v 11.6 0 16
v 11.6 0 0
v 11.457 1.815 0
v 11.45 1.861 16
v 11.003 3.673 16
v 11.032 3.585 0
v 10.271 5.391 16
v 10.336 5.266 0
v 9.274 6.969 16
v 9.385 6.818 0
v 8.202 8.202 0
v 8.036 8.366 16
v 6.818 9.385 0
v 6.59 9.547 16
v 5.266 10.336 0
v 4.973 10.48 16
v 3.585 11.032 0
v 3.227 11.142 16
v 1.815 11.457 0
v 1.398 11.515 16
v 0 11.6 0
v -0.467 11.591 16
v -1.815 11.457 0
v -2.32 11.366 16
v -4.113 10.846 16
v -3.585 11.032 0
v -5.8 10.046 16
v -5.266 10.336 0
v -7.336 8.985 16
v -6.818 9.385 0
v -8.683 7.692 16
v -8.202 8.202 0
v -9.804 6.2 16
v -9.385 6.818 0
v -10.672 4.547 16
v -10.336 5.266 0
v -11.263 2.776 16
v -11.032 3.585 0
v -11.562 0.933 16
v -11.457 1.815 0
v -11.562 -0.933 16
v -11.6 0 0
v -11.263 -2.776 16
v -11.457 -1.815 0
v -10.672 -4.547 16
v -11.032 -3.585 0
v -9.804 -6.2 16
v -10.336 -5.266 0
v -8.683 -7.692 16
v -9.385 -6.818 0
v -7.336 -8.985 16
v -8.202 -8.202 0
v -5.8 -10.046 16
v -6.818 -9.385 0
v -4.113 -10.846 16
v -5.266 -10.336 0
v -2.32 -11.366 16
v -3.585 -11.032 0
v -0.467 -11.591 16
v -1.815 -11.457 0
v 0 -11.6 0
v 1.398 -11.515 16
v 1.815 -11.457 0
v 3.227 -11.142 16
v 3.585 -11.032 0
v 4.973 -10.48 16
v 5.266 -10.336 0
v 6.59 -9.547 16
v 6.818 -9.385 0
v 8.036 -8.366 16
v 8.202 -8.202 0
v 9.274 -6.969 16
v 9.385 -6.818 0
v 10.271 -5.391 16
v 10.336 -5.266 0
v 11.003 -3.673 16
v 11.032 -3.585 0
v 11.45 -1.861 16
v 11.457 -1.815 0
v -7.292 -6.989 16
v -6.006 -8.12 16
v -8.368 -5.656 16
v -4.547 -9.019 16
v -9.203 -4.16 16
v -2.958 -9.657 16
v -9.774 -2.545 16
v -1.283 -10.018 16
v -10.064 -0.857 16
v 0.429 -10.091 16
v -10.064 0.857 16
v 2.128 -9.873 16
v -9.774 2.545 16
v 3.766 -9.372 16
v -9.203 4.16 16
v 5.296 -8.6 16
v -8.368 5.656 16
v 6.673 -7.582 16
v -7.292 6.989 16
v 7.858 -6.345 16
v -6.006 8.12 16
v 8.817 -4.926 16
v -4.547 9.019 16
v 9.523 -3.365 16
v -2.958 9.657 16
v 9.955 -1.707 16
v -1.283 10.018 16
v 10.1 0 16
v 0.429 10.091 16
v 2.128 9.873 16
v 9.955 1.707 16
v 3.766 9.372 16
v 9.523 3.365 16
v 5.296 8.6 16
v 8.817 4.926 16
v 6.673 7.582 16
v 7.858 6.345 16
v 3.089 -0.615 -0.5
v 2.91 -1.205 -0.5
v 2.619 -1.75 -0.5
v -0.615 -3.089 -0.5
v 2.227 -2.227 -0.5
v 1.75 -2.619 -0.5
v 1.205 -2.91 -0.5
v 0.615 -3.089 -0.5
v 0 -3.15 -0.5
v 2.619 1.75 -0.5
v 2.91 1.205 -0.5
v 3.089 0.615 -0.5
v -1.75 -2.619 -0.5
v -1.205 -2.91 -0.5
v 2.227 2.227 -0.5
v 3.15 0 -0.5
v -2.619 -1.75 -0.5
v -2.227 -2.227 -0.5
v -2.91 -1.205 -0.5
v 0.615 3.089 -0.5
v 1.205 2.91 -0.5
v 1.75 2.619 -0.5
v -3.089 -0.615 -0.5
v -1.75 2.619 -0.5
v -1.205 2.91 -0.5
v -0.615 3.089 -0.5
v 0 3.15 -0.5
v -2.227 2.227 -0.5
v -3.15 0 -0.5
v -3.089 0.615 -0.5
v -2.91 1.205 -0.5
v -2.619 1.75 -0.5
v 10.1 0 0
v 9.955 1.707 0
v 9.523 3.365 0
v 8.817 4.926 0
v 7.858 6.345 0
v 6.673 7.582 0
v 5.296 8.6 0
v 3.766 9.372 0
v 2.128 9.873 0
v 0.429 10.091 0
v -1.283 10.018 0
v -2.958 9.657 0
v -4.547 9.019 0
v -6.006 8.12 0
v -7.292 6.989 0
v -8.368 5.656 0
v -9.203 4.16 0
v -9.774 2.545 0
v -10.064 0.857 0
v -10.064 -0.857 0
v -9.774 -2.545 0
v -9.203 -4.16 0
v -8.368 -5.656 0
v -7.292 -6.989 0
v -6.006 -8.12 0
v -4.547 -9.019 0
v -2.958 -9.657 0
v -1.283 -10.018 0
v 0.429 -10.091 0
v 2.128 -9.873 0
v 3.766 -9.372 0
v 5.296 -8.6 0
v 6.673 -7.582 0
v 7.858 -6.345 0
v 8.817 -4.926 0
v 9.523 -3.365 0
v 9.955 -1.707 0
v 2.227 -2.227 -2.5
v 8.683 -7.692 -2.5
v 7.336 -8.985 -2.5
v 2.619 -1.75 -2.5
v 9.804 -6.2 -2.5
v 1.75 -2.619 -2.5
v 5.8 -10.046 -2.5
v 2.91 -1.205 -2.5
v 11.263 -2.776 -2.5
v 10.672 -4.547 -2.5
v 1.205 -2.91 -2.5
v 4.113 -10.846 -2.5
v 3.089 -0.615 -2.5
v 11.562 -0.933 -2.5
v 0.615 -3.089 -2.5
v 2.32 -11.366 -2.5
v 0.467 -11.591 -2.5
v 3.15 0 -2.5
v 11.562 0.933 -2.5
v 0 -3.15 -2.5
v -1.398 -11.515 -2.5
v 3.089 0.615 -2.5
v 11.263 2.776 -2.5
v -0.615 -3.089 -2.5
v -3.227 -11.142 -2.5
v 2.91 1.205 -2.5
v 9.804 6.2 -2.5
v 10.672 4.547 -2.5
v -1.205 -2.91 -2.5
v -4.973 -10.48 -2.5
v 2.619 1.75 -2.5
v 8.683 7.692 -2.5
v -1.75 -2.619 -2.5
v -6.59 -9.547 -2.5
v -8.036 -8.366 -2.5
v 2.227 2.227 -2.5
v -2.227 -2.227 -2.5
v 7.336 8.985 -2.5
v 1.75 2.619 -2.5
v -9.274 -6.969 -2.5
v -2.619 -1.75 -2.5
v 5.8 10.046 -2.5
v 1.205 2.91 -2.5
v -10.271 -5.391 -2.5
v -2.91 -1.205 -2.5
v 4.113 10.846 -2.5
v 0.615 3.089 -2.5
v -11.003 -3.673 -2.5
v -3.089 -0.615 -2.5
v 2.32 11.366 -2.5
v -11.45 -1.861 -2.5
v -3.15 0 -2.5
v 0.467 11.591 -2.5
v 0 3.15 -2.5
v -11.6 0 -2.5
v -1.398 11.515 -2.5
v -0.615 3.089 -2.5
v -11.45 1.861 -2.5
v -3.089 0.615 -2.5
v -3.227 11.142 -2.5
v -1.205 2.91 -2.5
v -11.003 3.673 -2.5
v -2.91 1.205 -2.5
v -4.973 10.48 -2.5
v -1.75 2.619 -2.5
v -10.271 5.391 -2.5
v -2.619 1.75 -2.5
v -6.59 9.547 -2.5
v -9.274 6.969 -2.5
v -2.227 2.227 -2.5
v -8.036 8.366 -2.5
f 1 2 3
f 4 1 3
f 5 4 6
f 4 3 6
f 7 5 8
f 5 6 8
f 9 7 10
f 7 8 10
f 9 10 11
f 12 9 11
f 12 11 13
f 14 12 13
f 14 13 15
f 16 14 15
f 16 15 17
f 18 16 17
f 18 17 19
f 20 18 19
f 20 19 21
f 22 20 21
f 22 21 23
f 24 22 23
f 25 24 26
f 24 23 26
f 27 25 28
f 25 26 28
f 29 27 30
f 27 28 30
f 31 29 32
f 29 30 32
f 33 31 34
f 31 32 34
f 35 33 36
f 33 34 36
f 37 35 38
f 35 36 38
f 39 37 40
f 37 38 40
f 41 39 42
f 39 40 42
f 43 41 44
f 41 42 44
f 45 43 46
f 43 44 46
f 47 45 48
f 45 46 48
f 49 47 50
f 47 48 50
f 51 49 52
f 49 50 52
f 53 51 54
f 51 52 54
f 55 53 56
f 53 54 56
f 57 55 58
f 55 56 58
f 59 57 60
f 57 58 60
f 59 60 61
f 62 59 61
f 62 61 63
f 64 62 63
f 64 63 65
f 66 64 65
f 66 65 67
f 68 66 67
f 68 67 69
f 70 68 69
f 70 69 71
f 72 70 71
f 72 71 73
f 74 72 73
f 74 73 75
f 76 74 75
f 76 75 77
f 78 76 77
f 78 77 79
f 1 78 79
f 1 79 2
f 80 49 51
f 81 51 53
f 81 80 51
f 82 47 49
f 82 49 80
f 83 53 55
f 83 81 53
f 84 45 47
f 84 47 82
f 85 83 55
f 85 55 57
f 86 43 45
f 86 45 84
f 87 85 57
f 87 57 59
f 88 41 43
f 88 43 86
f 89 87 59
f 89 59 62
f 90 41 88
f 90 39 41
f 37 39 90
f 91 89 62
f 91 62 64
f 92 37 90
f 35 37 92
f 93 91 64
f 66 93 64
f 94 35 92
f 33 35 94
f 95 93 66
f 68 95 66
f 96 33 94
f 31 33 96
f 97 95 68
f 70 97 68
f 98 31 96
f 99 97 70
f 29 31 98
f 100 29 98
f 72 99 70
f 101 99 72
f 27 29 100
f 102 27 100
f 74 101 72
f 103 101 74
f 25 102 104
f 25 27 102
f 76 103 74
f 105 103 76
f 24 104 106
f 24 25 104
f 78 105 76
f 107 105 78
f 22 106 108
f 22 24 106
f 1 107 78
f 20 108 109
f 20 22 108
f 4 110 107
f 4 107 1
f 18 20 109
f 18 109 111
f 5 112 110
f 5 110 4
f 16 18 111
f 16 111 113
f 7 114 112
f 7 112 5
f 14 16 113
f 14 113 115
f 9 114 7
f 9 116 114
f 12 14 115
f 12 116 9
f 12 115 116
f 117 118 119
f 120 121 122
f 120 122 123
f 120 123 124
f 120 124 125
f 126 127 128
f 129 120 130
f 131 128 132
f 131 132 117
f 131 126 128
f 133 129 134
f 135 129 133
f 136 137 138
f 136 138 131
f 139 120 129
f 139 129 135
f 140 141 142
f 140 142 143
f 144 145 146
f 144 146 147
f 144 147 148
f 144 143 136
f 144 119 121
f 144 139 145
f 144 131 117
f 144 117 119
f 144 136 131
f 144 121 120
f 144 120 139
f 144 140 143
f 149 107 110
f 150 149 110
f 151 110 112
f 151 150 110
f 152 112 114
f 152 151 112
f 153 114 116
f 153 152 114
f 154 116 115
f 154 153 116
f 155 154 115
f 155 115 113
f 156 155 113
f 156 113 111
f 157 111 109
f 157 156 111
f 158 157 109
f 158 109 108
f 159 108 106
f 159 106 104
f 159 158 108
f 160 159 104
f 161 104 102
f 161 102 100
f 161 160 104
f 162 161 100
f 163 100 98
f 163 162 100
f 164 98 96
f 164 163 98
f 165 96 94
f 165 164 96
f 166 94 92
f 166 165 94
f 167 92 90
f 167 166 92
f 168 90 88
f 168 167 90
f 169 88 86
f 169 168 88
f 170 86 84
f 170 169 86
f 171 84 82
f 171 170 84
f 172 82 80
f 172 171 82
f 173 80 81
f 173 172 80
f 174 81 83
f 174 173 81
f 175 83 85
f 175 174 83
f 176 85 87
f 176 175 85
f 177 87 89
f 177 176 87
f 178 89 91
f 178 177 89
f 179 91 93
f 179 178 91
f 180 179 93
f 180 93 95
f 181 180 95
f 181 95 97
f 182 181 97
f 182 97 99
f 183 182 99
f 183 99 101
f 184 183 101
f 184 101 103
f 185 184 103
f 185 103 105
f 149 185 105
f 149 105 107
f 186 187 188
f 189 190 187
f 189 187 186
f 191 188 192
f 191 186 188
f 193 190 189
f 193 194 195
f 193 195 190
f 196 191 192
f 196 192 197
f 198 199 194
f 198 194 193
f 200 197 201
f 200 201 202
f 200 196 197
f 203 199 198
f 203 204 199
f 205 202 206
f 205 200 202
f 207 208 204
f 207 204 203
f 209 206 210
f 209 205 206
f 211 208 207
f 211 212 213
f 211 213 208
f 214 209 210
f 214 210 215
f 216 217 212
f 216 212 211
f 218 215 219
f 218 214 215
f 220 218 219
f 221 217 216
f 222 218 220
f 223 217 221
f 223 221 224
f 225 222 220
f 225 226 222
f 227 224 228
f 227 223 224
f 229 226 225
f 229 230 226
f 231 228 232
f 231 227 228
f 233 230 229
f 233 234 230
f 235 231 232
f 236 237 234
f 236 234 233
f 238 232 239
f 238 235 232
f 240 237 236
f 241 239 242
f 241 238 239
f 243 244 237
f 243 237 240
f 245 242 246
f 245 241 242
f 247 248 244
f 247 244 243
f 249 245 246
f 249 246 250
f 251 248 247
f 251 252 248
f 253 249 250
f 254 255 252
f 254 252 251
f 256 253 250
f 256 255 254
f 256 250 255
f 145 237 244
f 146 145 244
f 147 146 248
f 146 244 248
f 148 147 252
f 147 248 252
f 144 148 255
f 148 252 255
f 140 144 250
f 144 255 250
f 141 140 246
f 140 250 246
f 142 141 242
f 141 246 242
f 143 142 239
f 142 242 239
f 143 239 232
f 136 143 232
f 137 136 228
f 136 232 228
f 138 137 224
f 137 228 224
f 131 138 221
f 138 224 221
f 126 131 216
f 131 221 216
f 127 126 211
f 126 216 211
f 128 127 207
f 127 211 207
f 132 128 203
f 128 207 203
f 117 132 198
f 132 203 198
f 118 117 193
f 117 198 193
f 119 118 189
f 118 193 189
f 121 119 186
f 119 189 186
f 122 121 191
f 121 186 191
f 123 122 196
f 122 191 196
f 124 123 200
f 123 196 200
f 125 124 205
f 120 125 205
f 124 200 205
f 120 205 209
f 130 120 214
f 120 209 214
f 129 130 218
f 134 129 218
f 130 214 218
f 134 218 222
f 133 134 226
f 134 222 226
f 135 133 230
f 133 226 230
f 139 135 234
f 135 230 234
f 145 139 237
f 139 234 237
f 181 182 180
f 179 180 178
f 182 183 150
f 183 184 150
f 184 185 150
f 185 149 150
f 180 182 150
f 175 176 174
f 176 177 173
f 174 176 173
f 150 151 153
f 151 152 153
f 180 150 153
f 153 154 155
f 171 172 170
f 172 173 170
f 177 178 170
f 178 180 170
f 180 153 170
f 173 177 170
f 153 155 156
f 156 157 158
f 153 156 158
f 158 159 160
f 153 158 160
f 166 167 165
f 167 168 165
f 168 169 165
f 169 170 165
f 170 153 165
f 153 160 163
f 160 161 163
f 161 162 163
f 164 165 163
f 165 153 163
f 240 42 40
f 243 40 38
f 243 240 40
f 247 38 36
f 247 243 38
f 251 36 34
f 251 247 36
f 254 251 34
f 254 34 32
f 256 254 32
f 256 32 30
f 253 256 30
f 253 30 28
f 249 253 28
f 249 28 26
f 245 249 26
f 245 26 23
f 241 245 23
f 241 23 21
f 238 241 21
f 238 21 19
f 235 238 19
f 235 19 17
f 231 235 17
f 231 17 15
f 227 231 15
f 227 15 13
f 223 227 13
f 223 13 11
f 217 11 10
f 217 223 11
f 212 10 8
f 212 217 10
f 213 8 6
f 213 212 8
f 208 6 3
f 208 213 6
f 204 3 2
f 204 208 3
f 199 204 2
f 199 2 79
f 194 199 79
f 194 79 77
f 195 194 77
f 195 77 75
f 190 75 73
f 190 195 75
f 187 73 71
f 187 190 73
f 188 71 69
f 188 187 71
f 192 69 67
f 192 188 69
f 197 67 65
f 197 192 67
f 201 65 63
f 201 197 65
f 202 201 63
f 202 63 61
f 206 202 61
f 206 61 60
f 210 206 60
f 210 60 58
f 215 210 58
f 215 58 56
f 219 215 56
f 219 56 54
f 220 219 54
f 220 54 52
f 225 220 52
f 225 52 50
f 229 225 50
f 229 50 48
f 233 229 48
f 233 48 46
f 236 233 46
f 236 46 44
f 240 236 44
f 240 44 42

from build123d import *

# Parameters (mm, degrees)
CROQUIS1_R              = 11.6
CROQUIS1_R_2            = 10.1
SALIENTE_EXTRUIR1_DEPTH = 16
SALIENTE_EXTRUIR2_START = 2.5
CROQUIS2_R              = 11.6
SALIENTE_EXTRUIR2_DEPTH = 2.5
CROQUIS3_R              = 3.15
CORTAR_EXTRUIR1_DEPTH   = 2


with BuildPart() as part:
    # Croquis1 → Saliente-Extruir1 (new body)
    with BuildSketch(Plane.XY):
        Circle(CROQUIS1_R)
        Circle(CROQUIS1_R_2, mode=Mode.SUBTRACT)
    extrude(amount=SALIENTE_EXTRUIR1_DEPTH)

    # Croquis2 → Saliente-Extruir2 (add)
    with BuildSketch(Plane(origin=(0, 0, 0), x_dir=(-1, 0, 0), z_dir=(0, 0, -1)).offset(SALIENTE_EXTRUIR2_START)):
        Circle(CROQUIS2_R)
    extrude(amount=-SALIENTE_EXTRUIR2_DEPTH)

    # Croquis3 → Cortar-Extruir1 (cut)
    with BuildSketch(Plane(origin=(0, 0, -2.5), x_dir=(-1, 0, 0), z_dir=(0, 0, -1))):
        Circle(CROQUIS3_R)
    extrude(amount=-CORTAR_EXTRUIR1_DEPTH, mode=Mode.SUBTRACT)


solid = part.part
